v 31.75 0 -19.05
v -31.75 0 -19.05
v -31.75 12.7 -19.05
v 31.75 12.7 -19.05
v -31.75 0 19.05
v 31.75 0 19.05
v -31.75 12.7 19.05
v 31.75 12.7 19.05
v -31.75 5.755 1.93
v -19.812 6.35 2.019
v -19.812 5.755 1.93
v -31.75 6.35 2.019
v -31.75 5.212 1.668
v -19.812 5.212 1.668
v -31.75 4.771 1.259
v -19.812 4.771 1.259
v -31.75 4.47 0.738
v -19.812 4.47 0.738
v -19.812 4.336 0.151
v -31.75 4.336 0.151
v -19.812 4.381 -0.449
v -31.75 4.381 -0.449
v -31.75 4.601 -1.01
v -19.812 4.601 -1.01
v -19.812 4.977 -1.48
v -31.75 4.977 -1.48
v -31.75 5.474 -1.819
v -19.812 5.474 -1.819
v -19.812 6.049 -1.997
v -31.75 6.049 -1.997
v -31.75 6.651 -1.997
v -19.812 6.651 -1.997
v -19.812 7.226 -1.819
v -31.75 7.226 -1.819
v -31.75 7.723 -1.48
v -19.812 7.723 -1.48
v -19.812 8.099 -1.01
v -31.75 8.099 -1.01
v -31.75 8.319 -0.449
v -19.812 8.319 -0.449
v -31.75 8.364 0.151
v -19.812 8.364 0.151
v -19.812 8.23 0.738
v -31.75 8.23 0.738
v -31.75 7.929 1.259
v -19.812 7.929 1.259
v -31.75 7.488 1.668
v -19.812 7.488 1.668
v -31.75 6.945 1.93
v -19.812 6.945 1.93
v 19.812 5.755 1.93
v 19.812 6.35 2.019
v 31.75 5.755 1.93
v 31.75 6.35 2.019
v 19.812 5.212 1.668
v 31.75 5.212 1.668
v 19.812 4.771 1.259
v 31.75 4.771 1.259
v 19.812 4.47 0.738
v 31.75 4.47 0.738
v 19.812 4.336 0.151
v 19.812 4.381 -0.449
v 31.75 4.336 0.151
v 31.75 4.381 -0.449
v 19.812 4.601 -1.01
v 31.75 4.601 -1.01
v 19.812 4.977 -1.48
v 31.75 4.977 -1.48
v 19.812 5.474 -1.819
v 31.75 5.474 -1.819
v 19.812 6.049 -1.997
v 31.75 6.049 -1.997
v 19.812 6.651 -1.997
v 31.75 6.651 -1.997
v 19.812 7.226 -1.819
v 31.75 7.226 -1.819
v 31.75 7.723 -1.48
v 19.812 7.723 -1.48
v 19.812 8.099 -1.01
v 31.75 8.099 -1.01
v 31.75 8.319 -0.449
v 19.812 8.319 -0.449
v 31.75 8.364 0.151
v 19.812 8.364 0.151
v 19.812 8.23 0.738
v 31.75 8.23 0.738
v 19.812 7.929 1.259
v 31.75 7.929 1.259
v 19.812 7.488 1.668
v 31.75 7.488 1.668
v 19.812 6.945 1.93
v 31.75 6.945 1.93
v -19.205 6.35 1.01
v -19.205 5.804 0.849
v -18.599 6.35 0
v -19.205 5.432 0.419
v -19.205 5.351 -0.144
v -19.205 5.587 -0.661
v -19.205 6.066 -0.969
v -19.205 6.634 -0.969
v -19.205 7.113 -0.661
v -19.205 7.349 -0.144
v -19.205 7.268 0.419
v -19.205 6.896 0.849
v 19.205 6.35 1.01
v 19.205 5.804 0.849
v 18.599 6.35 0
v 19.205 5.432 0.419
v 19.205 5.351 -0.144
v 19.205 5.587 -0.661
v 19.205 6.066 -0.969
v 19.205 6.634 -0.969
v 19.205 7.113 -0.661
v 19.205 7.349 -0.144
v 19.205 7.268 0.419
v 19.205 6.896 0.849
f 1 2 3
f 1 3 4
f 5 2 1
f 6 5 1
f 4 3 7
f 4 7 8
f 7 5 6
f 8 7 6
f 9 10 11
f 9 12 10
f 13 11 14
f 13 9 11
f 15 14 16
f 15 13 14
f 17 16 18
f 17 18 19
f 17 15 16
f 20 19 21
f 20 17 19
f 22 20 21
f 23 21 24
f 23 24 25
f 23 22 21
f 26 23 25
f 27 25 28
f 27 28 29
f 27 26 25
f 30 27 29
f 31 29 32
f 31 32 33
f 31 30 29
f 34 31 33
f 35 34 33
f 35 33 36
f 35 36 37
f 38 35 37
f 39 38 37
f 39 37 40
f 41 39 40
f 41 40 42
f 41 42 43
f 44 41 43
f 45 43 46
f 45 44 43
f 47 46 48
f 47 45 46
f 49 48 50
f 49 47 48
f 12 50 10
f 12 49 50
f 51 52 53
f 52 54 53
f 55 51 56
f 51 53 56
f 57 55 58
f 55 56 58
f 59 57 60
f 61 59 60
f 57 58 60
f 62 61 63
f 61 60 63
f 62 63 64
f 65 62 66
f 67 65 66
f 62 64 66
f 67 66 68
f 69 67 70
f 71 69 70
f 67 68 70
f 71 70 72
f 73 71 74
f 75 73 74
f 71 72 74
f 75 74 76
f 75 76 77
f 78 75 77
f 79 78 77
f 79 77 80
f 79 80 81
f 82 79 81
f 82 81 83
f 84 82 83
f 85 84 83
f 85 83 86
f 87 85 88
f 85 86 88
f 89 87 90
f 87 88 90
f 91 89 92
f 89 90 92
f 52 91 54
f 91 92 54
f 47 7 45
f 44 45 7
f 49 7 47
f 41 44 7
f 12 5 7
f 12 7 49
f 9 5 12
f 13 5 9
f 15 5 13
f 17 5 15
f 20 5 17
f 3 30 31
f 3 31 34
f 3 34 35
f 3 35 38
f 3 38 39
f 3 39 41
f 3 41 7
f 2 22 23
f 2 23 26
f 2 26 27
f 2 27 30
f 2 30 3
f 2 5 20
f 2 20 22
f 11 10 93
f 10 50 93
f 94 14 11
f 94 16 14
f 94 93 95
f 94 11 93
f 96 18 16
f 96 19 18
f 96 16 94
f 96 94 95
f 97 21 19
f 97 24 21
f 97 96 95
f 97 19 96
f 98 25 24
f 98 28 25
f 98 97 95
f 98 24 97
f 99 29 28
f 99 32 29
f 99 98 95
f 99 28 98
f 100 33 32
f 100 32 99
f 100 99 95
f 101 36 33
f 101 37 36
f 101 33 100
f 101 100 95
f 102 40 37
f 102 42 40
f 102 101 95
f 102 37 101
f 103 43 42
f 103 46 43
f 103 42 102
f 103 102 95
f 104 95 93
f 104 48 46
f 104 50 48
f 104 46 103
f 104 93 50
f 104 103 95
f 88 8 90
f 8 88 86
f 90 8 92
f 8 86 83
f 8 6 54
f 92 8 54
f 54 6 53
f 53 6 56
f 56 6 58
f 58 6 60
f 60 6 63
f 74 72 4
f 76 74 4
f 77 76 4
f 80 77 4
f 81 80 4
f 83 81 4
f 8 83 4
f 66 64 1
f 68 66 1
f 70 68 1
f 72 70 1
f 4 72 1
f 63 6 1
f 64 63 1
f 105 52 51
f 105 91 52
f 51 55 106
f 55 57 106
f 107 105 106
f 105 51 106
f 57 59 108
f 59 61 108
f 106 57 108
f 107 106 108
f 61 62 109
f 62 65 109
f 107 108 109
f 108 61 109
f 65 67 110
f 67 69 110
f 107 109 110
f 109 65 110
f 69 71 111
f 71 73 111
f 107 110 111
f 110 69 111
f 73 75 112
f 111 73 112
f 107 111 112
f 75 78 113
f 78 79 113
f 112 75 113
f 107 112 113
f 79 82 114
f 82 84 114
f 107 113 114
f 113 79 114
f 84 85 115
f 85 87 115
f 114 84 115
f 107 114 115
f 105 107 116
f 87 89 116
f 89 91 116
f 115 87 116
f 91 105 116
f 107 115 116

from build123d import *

# Parameters (mm, degrees)
SKETCH1_W           = 63.5
SKETCH1_H           = 38.1
BOSS_EXTRUDE1_DEPTH = 12.7


with BuildPart() as part:
    # Sketch1 → Boss-Extrude1 (new body)
    with BuildSketch(Plane(origin=(0, 0, 0), x_dir=(1, 0, 0), z_dir=(0, 1, 0))):
        Rectangle(SKETCH1_W, SKETCH1_H)
    extrude(amount=BOSS_EXTRUDE1_DEPTH)

    # Sketch5 → #10-32 Tapped Hole1 (revolve, cut)
    with BuildSketch(Plane(origin=(-31.75, 6.35, 0), x_dir=(0, 0, 1), z_dir=(0, 1, 0))):
        Polygon((0, 0), (0, 13.151317848), (2.0193, 11.938), (2.0193, 0), align=None)
    f_10_32_tapped_hole1 = revolve(axis=Axis((-38.1, 6.35, 0), (1, 0, 0)), mode=Mode.SUBTRACT)

    # Mirror1: #10-32 Tapped Hole1 across plane
    add(f_10_32_tapped_hole1.mirror(Plane(origin=(0, 0, 0), x_dir=(0, 0, 1), z_dir=(1, 0, 0))), mode=Mode.SUBTRACT)


solid = part.part
